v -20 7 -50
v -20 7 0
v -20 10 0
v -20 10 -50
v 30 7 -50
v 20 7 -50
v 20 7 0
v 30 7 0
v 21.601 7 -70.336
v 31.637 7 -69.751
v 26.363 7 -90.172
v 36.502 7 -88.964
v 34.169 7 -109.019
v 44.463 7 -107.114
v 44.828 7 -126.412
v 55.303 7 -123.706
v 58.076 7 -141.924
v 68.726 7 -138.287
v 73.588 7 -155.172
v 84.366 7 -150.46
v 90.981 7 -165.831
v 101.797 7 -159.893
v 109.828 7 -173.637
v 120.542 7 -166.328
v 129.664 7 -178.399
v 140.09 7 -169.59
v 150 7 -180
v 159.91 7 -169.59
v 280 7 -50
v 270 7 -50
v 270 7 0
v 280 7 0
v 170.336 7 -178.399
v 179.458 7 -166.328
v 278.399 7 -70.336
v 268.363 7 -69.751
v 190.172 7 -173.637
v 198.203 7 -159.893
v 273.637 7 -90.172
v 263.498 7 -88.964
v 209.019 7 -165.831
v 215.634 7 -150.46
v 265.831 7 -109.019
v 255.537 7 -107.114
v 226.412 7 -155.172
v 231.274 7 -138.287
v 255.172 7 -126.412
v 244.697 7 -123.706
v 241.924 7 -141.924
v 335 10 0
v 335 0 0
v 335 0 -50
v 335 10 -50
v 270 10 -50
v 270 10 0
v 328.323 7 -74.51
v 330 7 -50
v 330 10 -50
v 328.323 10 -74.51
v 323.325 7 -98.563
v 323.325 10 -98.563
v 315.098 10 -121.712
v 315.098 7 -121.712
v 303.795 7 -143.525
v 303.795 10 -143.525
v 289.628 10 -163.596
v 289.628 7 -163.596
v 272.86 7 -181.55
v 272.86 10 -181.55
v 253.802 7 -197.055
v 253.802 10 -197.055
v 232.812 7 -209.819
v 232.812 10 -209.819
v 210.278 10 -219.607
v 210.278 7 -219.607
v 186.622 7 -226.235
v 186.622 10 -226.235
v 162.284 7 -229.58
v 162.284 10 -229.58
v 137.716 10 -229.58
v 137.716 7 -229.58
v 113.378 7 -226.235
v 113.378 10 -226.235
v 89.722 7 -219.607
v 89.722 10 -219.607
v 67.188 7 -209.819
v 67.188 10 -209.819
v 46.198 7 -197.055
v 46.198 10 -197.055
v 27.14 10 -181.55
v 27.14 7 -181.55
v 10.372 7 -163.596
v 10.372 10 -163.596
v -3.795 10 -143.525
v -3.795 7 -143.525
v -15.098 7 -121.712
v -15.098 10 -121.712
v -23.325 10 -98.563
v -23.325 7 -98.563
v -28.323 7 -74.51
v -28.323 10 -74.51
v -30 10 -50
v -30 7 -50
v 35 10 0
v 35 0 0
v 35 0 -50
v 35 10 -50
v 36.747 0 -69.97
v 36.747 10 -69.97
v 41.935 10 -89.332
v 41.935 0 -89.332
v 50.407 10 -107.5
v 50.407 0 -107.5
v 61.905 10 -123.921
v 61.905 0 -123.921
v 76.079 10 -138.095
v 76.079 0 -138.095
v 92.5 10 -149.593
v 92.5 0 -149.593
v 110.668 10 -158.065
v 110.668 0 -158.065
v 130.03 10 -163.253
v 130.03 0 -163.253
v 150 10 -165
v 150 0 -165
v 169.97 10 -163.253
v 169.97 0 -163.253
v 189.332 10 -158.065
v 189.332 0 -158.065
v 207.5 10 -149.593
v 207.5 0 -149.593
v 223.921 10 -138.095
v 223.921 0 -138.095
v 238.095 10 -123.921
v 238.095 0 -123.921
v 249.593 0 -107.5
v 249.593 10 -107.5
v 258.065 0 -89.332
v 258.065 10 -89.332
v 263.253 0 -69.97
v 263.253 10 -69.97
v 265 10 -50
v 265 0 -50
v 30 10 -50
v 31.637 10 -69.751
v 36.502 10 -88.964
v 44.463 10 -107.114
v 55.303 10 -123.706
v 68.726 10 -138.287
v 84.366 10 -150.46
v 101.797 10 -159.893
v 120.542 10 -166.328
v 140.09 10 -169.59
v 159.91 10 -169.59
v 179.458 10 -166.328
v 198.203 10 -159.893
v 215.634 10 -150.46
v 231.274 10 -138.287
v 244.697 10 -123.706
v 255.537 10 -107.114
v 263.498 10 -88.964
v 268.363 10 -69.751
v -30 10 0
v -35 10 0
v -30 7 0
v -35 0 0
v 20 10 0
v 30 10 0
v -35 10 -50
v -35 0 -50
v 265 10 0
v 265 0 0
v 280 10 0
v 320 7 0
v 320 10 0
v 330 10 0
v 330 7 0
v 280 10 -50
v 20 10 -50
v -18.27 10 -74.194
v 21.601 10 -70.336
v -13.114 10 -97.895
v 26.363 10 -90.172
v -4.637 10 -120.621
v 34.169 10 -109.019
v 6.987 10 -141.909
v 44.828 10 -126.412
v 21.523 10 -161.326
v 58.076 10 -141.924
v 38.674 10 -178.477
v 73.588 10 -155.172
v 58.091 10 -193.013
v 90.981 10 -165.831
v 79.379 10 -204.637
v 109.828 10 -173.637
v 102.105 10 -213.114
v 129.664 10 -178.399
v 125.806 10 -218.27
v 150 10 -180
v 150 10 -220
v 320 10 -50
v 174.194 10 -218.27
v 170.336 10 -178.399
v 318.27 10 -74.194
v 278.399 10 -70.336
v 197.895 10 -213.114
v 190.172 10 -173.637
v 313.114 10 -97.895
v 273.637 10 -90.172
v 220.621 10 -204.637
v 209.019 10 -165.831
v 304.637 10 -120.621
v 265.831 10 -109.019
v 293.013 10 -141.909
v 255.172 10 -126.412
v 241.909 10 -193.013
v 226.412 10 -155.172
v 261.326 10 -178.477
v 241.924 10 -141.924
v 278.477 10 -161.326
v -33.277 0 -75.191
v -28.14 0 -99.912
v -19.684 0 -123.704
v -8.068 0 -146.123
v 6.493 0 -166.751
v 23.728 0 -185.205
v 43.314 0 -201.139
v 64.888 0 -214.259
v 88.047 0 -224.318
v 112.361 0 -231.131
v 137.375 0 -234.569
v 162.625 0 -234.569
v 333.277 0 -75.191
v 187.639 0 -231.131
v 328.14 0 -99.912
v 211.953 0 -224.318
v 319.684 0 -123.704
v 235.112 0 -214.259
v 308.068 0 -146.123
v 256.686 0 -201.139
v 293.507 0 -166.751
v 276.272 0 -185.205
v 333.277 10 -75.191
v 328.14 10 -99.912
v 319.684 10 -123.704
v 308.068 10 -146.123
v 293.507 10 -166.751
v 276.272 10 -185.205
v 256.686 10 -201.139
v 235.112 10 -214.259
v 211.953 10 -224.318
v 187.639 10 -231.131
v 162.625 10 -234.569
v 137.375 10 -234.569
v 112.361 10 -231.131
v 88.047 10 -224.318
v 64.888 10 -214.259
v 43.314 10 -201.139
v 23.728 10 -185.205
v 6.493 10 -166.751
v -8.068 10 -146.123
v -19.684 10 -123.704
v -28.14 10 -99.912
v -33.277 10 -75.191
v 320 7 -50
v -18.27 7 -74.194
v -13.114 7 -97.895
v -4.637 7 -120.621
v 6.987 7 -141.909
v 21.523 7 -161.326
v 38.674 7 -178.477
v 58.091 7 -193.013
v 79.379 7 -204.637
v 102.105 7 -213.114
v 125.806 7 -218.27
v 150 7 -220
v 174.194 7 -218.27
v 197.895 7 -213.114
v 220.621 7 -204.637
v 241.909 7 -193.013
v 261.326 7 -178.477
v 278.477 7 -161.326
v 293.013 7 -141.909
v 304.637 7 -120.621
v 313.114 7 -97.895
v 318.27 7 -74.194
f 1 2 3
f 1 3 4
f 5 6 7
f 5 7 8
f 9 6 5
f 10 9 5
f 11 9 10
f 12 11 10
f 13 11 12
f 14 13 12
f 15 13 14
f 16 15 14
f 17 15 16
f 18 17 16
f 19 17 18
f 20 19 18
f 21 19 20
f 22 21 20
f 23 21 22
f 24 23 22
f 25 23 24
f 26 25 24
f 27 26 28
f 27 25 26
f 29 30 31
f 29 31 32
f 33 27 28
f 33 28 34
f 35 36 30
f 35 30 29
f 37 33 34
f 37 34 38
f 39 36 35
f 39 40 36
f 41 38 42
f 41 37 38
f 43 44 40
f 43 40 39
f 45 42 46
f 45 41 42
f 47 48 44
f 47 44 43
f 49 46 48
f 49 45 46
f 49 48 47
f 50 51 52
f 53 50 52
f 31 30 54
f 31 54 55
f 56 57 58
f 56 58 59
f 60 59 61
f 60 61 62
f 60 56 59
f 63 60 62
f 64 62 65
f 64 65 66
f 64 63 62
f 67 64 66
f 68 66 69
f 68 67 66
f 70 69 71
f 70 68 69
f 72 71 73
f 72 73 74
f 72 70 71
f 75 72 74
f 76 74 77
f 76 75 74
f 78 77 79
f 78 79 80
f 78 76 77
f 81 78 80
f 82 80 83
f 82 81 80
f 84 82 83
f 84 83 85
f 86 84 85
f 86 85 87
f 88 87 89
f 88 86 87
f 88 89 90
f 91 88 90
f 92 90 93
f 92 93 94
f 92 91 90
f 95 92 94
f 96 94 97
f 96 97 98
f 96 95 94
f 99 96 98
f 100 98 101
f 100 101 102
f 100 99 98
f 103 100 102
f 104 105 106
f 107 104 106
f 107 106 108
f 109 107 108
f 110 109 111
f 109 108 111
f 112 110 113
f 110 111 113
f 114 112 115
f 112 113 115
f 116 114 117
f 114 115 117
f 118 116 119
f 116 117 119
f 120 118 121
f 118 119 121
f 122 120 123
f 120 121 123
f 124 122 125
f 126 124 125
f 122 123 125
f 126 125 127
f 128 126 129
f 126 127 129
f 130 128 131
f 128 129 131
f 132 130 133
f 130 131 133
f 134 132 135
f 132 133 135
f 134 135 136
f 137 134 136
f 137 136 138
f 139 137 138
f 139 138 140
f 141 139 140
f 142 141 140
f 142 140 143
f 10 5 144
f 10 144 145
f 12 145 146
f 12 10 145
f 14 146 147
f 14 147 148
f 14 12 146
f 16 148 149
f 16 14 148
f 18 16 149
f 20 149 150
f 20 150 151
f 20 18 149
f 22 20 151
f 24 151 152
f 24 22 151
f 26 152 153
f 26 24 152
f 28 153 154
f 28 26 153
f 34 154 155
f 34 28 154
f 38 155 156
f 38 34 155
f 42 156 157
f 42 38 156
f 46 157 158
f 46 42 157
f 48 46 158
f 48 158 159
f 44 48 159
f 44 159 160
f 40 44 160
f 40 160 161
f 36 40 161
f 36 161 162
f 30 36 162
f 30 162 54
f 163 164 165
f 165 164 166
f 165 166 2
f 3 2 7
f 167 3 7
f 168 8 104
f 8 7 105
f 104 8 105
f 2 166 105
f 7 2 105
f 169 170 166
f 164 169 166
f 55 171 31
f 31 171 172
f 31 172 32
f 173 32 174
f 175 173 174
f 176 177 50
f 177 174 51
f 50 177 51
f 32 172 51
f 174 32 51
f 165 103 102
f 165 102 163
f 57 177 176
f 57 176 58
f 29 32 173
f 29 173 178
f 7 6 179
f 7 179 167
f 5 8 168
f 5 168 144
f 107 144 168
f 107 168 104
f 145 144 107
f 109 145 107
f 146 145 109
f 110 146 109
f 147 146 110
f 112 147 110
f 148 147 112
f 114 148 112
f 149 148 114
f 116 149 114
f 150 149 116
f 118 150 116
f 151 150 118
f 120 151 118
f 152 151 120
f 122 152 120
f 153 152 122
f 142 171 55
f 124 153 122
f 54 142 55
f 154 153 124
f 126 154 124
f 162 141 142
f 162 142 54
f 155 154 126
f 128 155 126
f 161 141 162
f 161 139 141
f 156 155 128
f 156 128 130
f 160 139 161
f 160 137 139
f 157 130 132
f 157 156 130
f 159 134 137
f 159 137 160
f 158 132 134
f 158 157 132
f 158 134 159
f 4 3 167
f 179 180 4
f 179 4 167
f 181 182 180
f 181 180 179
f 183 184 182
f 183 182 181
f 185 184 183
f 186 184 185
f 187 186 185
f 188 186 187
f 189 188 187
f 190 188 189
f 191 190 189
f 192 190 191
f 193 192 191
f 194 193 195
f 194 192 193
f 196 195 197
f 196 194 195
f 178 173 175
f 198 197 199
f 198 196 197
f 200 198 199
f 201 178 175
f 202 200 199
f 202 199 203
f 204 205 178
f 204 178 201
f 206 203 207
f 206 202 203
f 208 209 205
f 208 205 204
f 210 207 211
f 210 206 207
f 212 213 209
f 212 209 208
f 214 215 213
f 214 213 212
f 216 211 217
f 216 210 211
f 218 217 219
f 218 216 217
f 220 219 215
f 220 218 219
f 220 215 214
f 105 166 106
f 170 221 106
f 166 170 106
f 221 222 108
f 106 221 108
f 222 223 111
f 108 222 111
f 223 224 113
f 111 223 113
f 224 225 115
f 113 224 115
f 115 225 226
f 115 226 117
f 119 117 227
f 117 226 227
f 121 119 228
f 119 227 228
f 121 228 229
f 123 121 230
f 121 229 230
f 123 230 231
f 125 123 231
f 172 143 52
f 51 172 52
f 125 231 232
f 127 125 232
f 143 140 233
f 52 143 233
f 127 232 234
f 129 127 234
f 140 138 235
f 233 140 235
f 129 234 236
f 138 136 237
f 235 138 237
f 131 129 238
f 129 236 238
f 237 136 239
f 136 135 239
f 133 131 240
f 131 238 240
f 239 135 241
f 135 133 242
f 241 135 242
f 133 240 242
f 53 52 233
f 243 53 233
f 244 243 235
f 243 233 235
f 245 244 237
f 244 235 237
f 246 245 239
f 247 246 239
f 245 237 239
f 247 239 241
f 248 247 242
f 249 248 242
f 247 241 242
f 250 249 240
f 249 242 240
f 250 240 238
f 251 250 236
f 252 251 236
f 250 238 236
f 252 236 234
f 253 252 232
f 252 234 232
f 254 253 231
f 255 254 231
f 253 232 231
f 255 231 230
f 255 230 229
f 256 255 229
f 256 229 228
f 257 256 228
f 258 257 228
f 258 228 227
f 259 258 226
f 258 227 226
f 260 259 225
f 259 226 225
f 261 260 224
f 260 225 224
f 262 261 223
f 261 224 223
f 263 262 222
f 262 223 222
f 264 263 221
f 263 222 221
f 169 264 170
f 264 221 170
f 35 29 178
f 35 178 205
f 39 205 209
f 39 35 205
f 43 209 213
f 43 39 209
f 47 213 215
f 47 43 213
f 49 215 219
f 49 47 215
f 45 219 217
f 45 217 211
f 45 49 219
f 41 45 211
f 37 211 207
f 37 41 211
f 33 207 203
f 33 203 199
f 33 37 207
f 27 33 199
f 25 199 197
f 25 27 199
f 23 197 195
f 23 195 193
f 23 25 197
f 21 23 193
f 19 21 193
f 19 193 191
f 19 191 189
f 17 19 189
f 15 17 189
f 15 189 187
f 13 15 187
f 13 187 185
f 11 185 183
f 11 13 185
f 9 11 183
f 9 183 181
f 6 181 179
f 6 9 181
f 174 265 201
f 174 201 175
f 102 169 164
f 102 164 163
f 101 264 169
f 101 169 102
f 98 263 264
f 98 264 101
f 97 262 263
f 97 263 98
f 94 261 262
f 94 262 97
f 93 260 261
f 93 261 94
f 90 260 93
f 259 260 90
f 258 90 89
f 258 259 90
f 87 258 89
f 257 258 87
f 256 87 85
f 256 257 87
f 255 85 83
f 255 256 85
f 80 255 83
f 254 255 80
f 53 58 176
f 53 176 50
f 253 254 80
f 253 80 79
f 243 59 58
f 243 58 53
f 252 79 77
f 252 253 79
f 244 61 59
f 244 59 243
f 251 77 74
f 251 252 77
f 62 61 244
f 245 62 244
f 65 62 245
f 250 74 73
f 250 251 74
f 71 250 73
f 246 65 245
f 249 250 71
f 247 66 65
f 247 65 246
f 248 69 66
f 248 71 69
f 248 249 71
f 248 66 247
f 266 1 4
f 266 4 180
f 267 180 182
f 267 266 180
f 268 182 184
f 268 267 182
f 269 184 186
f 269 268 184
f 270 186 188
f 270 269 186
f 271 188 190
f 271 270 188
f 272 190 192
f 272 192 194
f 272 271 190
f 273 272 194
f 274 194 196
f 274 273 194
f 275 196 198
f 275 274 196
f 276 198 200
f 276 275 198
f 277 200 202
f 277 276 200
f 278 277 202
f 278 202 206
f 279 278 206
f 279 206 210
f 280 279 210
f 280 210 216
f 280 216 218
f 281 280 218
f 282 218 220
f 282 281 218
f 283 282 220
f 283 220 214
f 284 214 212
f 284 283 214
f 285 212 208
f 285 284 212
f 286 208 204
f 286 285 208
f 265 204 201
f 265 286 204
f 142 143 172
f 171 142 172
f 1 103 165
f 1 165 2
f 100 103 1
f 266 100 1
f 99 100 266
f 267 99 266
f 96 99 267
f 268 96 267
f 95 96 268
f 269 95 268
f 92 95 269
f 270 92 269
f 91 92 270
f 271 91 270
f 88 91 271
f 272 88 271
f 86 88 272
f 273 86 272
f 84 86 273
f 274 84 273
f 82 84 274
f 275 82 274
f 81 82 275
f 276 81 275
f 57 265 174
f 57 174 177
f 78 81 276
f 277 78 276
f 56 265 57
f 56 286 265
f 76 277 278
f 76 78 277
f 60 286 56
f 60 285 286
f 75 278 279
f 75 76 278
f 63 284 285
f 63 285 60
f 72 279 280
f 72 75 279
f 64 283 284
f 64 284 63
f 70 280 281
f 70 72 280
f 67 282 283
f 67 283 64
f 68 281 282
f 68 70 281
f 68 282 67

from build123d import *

# Parameters (mm, degrees)
BOSS_EXTRUDE1_DEPTH = 10
CUT_SWEEP1_START    = 7
CUT_SWEEP1_DEPTH    = 3


# Read off the part's stored shape, not the designer's step: Cut-Sweep1
with BuildPart() as part:
    # Sketch1 → Boss-Extrude1 (new body)
    with BuildSketch(Plane(origin=(0, 0, 0), x_dir=(1, 0, 0), z_dir=(0, 1, 0))):
        with BuildLine():
            Line((-35, 0), (35, 0))
            Line((35, 0), (35, 50))
            ThreePointArc((35, 50), (150, 165), (265, 50))
            Line((265, 50), (265, 0))
            Line((265, 0), (335, 0))
            Line((335, 0), (335, 50))
            ThreePointArc((335, 50), (150, 235), (-35, 50))
            Line((-35, 50), (-35, 0))
        make_face()
    extrude(amount=BOSS_EXTRUDE1_DEPTH)

    # Cut-Sweep1 outline → Cut-Sweep1 (cut)
    with BuildSketch(Plane(origin=(0, 0, 0), x_dir=(1, 0, 0), z_dir=(0, 1, 0)).offset(CUT_SWEEP1_START)):
        with BuildLine():
            Line((-30, 50), (-30, 0))
            Line((-30, 0), (-20, 0))
            Line((-20, 0), (-20, 50))
            ThreePointArc((-20, 50), (150, 220), (320, 50))
            Line((320, 50), (320, 0))
            Line((320, 0), (330, 0))
            Line((330, 0), (330, 50))
            ThreePointArc((330, 50), (150, 230), (-30, 50))
        make_face()
        with BuildLine():
            Line((20, 50), (20, 0))
            Line((20, 0), (30, 0))
            Line((30, 0), (30, 50))
            ThreePointArc((30, 50), (150, 170), (270, 50))
            Line((270, 50), (270, 0))
            Line((270, 0), (280, 0))
            Line((280, 0), (280, 50))
            ThreePointArc((280, 50), (150, 180), (20, 50))
        make_face()
    extrude(amount=CUT_SWEEP1_DEPTH, mode=Mode.SUBTRACT)


solid = part.part
